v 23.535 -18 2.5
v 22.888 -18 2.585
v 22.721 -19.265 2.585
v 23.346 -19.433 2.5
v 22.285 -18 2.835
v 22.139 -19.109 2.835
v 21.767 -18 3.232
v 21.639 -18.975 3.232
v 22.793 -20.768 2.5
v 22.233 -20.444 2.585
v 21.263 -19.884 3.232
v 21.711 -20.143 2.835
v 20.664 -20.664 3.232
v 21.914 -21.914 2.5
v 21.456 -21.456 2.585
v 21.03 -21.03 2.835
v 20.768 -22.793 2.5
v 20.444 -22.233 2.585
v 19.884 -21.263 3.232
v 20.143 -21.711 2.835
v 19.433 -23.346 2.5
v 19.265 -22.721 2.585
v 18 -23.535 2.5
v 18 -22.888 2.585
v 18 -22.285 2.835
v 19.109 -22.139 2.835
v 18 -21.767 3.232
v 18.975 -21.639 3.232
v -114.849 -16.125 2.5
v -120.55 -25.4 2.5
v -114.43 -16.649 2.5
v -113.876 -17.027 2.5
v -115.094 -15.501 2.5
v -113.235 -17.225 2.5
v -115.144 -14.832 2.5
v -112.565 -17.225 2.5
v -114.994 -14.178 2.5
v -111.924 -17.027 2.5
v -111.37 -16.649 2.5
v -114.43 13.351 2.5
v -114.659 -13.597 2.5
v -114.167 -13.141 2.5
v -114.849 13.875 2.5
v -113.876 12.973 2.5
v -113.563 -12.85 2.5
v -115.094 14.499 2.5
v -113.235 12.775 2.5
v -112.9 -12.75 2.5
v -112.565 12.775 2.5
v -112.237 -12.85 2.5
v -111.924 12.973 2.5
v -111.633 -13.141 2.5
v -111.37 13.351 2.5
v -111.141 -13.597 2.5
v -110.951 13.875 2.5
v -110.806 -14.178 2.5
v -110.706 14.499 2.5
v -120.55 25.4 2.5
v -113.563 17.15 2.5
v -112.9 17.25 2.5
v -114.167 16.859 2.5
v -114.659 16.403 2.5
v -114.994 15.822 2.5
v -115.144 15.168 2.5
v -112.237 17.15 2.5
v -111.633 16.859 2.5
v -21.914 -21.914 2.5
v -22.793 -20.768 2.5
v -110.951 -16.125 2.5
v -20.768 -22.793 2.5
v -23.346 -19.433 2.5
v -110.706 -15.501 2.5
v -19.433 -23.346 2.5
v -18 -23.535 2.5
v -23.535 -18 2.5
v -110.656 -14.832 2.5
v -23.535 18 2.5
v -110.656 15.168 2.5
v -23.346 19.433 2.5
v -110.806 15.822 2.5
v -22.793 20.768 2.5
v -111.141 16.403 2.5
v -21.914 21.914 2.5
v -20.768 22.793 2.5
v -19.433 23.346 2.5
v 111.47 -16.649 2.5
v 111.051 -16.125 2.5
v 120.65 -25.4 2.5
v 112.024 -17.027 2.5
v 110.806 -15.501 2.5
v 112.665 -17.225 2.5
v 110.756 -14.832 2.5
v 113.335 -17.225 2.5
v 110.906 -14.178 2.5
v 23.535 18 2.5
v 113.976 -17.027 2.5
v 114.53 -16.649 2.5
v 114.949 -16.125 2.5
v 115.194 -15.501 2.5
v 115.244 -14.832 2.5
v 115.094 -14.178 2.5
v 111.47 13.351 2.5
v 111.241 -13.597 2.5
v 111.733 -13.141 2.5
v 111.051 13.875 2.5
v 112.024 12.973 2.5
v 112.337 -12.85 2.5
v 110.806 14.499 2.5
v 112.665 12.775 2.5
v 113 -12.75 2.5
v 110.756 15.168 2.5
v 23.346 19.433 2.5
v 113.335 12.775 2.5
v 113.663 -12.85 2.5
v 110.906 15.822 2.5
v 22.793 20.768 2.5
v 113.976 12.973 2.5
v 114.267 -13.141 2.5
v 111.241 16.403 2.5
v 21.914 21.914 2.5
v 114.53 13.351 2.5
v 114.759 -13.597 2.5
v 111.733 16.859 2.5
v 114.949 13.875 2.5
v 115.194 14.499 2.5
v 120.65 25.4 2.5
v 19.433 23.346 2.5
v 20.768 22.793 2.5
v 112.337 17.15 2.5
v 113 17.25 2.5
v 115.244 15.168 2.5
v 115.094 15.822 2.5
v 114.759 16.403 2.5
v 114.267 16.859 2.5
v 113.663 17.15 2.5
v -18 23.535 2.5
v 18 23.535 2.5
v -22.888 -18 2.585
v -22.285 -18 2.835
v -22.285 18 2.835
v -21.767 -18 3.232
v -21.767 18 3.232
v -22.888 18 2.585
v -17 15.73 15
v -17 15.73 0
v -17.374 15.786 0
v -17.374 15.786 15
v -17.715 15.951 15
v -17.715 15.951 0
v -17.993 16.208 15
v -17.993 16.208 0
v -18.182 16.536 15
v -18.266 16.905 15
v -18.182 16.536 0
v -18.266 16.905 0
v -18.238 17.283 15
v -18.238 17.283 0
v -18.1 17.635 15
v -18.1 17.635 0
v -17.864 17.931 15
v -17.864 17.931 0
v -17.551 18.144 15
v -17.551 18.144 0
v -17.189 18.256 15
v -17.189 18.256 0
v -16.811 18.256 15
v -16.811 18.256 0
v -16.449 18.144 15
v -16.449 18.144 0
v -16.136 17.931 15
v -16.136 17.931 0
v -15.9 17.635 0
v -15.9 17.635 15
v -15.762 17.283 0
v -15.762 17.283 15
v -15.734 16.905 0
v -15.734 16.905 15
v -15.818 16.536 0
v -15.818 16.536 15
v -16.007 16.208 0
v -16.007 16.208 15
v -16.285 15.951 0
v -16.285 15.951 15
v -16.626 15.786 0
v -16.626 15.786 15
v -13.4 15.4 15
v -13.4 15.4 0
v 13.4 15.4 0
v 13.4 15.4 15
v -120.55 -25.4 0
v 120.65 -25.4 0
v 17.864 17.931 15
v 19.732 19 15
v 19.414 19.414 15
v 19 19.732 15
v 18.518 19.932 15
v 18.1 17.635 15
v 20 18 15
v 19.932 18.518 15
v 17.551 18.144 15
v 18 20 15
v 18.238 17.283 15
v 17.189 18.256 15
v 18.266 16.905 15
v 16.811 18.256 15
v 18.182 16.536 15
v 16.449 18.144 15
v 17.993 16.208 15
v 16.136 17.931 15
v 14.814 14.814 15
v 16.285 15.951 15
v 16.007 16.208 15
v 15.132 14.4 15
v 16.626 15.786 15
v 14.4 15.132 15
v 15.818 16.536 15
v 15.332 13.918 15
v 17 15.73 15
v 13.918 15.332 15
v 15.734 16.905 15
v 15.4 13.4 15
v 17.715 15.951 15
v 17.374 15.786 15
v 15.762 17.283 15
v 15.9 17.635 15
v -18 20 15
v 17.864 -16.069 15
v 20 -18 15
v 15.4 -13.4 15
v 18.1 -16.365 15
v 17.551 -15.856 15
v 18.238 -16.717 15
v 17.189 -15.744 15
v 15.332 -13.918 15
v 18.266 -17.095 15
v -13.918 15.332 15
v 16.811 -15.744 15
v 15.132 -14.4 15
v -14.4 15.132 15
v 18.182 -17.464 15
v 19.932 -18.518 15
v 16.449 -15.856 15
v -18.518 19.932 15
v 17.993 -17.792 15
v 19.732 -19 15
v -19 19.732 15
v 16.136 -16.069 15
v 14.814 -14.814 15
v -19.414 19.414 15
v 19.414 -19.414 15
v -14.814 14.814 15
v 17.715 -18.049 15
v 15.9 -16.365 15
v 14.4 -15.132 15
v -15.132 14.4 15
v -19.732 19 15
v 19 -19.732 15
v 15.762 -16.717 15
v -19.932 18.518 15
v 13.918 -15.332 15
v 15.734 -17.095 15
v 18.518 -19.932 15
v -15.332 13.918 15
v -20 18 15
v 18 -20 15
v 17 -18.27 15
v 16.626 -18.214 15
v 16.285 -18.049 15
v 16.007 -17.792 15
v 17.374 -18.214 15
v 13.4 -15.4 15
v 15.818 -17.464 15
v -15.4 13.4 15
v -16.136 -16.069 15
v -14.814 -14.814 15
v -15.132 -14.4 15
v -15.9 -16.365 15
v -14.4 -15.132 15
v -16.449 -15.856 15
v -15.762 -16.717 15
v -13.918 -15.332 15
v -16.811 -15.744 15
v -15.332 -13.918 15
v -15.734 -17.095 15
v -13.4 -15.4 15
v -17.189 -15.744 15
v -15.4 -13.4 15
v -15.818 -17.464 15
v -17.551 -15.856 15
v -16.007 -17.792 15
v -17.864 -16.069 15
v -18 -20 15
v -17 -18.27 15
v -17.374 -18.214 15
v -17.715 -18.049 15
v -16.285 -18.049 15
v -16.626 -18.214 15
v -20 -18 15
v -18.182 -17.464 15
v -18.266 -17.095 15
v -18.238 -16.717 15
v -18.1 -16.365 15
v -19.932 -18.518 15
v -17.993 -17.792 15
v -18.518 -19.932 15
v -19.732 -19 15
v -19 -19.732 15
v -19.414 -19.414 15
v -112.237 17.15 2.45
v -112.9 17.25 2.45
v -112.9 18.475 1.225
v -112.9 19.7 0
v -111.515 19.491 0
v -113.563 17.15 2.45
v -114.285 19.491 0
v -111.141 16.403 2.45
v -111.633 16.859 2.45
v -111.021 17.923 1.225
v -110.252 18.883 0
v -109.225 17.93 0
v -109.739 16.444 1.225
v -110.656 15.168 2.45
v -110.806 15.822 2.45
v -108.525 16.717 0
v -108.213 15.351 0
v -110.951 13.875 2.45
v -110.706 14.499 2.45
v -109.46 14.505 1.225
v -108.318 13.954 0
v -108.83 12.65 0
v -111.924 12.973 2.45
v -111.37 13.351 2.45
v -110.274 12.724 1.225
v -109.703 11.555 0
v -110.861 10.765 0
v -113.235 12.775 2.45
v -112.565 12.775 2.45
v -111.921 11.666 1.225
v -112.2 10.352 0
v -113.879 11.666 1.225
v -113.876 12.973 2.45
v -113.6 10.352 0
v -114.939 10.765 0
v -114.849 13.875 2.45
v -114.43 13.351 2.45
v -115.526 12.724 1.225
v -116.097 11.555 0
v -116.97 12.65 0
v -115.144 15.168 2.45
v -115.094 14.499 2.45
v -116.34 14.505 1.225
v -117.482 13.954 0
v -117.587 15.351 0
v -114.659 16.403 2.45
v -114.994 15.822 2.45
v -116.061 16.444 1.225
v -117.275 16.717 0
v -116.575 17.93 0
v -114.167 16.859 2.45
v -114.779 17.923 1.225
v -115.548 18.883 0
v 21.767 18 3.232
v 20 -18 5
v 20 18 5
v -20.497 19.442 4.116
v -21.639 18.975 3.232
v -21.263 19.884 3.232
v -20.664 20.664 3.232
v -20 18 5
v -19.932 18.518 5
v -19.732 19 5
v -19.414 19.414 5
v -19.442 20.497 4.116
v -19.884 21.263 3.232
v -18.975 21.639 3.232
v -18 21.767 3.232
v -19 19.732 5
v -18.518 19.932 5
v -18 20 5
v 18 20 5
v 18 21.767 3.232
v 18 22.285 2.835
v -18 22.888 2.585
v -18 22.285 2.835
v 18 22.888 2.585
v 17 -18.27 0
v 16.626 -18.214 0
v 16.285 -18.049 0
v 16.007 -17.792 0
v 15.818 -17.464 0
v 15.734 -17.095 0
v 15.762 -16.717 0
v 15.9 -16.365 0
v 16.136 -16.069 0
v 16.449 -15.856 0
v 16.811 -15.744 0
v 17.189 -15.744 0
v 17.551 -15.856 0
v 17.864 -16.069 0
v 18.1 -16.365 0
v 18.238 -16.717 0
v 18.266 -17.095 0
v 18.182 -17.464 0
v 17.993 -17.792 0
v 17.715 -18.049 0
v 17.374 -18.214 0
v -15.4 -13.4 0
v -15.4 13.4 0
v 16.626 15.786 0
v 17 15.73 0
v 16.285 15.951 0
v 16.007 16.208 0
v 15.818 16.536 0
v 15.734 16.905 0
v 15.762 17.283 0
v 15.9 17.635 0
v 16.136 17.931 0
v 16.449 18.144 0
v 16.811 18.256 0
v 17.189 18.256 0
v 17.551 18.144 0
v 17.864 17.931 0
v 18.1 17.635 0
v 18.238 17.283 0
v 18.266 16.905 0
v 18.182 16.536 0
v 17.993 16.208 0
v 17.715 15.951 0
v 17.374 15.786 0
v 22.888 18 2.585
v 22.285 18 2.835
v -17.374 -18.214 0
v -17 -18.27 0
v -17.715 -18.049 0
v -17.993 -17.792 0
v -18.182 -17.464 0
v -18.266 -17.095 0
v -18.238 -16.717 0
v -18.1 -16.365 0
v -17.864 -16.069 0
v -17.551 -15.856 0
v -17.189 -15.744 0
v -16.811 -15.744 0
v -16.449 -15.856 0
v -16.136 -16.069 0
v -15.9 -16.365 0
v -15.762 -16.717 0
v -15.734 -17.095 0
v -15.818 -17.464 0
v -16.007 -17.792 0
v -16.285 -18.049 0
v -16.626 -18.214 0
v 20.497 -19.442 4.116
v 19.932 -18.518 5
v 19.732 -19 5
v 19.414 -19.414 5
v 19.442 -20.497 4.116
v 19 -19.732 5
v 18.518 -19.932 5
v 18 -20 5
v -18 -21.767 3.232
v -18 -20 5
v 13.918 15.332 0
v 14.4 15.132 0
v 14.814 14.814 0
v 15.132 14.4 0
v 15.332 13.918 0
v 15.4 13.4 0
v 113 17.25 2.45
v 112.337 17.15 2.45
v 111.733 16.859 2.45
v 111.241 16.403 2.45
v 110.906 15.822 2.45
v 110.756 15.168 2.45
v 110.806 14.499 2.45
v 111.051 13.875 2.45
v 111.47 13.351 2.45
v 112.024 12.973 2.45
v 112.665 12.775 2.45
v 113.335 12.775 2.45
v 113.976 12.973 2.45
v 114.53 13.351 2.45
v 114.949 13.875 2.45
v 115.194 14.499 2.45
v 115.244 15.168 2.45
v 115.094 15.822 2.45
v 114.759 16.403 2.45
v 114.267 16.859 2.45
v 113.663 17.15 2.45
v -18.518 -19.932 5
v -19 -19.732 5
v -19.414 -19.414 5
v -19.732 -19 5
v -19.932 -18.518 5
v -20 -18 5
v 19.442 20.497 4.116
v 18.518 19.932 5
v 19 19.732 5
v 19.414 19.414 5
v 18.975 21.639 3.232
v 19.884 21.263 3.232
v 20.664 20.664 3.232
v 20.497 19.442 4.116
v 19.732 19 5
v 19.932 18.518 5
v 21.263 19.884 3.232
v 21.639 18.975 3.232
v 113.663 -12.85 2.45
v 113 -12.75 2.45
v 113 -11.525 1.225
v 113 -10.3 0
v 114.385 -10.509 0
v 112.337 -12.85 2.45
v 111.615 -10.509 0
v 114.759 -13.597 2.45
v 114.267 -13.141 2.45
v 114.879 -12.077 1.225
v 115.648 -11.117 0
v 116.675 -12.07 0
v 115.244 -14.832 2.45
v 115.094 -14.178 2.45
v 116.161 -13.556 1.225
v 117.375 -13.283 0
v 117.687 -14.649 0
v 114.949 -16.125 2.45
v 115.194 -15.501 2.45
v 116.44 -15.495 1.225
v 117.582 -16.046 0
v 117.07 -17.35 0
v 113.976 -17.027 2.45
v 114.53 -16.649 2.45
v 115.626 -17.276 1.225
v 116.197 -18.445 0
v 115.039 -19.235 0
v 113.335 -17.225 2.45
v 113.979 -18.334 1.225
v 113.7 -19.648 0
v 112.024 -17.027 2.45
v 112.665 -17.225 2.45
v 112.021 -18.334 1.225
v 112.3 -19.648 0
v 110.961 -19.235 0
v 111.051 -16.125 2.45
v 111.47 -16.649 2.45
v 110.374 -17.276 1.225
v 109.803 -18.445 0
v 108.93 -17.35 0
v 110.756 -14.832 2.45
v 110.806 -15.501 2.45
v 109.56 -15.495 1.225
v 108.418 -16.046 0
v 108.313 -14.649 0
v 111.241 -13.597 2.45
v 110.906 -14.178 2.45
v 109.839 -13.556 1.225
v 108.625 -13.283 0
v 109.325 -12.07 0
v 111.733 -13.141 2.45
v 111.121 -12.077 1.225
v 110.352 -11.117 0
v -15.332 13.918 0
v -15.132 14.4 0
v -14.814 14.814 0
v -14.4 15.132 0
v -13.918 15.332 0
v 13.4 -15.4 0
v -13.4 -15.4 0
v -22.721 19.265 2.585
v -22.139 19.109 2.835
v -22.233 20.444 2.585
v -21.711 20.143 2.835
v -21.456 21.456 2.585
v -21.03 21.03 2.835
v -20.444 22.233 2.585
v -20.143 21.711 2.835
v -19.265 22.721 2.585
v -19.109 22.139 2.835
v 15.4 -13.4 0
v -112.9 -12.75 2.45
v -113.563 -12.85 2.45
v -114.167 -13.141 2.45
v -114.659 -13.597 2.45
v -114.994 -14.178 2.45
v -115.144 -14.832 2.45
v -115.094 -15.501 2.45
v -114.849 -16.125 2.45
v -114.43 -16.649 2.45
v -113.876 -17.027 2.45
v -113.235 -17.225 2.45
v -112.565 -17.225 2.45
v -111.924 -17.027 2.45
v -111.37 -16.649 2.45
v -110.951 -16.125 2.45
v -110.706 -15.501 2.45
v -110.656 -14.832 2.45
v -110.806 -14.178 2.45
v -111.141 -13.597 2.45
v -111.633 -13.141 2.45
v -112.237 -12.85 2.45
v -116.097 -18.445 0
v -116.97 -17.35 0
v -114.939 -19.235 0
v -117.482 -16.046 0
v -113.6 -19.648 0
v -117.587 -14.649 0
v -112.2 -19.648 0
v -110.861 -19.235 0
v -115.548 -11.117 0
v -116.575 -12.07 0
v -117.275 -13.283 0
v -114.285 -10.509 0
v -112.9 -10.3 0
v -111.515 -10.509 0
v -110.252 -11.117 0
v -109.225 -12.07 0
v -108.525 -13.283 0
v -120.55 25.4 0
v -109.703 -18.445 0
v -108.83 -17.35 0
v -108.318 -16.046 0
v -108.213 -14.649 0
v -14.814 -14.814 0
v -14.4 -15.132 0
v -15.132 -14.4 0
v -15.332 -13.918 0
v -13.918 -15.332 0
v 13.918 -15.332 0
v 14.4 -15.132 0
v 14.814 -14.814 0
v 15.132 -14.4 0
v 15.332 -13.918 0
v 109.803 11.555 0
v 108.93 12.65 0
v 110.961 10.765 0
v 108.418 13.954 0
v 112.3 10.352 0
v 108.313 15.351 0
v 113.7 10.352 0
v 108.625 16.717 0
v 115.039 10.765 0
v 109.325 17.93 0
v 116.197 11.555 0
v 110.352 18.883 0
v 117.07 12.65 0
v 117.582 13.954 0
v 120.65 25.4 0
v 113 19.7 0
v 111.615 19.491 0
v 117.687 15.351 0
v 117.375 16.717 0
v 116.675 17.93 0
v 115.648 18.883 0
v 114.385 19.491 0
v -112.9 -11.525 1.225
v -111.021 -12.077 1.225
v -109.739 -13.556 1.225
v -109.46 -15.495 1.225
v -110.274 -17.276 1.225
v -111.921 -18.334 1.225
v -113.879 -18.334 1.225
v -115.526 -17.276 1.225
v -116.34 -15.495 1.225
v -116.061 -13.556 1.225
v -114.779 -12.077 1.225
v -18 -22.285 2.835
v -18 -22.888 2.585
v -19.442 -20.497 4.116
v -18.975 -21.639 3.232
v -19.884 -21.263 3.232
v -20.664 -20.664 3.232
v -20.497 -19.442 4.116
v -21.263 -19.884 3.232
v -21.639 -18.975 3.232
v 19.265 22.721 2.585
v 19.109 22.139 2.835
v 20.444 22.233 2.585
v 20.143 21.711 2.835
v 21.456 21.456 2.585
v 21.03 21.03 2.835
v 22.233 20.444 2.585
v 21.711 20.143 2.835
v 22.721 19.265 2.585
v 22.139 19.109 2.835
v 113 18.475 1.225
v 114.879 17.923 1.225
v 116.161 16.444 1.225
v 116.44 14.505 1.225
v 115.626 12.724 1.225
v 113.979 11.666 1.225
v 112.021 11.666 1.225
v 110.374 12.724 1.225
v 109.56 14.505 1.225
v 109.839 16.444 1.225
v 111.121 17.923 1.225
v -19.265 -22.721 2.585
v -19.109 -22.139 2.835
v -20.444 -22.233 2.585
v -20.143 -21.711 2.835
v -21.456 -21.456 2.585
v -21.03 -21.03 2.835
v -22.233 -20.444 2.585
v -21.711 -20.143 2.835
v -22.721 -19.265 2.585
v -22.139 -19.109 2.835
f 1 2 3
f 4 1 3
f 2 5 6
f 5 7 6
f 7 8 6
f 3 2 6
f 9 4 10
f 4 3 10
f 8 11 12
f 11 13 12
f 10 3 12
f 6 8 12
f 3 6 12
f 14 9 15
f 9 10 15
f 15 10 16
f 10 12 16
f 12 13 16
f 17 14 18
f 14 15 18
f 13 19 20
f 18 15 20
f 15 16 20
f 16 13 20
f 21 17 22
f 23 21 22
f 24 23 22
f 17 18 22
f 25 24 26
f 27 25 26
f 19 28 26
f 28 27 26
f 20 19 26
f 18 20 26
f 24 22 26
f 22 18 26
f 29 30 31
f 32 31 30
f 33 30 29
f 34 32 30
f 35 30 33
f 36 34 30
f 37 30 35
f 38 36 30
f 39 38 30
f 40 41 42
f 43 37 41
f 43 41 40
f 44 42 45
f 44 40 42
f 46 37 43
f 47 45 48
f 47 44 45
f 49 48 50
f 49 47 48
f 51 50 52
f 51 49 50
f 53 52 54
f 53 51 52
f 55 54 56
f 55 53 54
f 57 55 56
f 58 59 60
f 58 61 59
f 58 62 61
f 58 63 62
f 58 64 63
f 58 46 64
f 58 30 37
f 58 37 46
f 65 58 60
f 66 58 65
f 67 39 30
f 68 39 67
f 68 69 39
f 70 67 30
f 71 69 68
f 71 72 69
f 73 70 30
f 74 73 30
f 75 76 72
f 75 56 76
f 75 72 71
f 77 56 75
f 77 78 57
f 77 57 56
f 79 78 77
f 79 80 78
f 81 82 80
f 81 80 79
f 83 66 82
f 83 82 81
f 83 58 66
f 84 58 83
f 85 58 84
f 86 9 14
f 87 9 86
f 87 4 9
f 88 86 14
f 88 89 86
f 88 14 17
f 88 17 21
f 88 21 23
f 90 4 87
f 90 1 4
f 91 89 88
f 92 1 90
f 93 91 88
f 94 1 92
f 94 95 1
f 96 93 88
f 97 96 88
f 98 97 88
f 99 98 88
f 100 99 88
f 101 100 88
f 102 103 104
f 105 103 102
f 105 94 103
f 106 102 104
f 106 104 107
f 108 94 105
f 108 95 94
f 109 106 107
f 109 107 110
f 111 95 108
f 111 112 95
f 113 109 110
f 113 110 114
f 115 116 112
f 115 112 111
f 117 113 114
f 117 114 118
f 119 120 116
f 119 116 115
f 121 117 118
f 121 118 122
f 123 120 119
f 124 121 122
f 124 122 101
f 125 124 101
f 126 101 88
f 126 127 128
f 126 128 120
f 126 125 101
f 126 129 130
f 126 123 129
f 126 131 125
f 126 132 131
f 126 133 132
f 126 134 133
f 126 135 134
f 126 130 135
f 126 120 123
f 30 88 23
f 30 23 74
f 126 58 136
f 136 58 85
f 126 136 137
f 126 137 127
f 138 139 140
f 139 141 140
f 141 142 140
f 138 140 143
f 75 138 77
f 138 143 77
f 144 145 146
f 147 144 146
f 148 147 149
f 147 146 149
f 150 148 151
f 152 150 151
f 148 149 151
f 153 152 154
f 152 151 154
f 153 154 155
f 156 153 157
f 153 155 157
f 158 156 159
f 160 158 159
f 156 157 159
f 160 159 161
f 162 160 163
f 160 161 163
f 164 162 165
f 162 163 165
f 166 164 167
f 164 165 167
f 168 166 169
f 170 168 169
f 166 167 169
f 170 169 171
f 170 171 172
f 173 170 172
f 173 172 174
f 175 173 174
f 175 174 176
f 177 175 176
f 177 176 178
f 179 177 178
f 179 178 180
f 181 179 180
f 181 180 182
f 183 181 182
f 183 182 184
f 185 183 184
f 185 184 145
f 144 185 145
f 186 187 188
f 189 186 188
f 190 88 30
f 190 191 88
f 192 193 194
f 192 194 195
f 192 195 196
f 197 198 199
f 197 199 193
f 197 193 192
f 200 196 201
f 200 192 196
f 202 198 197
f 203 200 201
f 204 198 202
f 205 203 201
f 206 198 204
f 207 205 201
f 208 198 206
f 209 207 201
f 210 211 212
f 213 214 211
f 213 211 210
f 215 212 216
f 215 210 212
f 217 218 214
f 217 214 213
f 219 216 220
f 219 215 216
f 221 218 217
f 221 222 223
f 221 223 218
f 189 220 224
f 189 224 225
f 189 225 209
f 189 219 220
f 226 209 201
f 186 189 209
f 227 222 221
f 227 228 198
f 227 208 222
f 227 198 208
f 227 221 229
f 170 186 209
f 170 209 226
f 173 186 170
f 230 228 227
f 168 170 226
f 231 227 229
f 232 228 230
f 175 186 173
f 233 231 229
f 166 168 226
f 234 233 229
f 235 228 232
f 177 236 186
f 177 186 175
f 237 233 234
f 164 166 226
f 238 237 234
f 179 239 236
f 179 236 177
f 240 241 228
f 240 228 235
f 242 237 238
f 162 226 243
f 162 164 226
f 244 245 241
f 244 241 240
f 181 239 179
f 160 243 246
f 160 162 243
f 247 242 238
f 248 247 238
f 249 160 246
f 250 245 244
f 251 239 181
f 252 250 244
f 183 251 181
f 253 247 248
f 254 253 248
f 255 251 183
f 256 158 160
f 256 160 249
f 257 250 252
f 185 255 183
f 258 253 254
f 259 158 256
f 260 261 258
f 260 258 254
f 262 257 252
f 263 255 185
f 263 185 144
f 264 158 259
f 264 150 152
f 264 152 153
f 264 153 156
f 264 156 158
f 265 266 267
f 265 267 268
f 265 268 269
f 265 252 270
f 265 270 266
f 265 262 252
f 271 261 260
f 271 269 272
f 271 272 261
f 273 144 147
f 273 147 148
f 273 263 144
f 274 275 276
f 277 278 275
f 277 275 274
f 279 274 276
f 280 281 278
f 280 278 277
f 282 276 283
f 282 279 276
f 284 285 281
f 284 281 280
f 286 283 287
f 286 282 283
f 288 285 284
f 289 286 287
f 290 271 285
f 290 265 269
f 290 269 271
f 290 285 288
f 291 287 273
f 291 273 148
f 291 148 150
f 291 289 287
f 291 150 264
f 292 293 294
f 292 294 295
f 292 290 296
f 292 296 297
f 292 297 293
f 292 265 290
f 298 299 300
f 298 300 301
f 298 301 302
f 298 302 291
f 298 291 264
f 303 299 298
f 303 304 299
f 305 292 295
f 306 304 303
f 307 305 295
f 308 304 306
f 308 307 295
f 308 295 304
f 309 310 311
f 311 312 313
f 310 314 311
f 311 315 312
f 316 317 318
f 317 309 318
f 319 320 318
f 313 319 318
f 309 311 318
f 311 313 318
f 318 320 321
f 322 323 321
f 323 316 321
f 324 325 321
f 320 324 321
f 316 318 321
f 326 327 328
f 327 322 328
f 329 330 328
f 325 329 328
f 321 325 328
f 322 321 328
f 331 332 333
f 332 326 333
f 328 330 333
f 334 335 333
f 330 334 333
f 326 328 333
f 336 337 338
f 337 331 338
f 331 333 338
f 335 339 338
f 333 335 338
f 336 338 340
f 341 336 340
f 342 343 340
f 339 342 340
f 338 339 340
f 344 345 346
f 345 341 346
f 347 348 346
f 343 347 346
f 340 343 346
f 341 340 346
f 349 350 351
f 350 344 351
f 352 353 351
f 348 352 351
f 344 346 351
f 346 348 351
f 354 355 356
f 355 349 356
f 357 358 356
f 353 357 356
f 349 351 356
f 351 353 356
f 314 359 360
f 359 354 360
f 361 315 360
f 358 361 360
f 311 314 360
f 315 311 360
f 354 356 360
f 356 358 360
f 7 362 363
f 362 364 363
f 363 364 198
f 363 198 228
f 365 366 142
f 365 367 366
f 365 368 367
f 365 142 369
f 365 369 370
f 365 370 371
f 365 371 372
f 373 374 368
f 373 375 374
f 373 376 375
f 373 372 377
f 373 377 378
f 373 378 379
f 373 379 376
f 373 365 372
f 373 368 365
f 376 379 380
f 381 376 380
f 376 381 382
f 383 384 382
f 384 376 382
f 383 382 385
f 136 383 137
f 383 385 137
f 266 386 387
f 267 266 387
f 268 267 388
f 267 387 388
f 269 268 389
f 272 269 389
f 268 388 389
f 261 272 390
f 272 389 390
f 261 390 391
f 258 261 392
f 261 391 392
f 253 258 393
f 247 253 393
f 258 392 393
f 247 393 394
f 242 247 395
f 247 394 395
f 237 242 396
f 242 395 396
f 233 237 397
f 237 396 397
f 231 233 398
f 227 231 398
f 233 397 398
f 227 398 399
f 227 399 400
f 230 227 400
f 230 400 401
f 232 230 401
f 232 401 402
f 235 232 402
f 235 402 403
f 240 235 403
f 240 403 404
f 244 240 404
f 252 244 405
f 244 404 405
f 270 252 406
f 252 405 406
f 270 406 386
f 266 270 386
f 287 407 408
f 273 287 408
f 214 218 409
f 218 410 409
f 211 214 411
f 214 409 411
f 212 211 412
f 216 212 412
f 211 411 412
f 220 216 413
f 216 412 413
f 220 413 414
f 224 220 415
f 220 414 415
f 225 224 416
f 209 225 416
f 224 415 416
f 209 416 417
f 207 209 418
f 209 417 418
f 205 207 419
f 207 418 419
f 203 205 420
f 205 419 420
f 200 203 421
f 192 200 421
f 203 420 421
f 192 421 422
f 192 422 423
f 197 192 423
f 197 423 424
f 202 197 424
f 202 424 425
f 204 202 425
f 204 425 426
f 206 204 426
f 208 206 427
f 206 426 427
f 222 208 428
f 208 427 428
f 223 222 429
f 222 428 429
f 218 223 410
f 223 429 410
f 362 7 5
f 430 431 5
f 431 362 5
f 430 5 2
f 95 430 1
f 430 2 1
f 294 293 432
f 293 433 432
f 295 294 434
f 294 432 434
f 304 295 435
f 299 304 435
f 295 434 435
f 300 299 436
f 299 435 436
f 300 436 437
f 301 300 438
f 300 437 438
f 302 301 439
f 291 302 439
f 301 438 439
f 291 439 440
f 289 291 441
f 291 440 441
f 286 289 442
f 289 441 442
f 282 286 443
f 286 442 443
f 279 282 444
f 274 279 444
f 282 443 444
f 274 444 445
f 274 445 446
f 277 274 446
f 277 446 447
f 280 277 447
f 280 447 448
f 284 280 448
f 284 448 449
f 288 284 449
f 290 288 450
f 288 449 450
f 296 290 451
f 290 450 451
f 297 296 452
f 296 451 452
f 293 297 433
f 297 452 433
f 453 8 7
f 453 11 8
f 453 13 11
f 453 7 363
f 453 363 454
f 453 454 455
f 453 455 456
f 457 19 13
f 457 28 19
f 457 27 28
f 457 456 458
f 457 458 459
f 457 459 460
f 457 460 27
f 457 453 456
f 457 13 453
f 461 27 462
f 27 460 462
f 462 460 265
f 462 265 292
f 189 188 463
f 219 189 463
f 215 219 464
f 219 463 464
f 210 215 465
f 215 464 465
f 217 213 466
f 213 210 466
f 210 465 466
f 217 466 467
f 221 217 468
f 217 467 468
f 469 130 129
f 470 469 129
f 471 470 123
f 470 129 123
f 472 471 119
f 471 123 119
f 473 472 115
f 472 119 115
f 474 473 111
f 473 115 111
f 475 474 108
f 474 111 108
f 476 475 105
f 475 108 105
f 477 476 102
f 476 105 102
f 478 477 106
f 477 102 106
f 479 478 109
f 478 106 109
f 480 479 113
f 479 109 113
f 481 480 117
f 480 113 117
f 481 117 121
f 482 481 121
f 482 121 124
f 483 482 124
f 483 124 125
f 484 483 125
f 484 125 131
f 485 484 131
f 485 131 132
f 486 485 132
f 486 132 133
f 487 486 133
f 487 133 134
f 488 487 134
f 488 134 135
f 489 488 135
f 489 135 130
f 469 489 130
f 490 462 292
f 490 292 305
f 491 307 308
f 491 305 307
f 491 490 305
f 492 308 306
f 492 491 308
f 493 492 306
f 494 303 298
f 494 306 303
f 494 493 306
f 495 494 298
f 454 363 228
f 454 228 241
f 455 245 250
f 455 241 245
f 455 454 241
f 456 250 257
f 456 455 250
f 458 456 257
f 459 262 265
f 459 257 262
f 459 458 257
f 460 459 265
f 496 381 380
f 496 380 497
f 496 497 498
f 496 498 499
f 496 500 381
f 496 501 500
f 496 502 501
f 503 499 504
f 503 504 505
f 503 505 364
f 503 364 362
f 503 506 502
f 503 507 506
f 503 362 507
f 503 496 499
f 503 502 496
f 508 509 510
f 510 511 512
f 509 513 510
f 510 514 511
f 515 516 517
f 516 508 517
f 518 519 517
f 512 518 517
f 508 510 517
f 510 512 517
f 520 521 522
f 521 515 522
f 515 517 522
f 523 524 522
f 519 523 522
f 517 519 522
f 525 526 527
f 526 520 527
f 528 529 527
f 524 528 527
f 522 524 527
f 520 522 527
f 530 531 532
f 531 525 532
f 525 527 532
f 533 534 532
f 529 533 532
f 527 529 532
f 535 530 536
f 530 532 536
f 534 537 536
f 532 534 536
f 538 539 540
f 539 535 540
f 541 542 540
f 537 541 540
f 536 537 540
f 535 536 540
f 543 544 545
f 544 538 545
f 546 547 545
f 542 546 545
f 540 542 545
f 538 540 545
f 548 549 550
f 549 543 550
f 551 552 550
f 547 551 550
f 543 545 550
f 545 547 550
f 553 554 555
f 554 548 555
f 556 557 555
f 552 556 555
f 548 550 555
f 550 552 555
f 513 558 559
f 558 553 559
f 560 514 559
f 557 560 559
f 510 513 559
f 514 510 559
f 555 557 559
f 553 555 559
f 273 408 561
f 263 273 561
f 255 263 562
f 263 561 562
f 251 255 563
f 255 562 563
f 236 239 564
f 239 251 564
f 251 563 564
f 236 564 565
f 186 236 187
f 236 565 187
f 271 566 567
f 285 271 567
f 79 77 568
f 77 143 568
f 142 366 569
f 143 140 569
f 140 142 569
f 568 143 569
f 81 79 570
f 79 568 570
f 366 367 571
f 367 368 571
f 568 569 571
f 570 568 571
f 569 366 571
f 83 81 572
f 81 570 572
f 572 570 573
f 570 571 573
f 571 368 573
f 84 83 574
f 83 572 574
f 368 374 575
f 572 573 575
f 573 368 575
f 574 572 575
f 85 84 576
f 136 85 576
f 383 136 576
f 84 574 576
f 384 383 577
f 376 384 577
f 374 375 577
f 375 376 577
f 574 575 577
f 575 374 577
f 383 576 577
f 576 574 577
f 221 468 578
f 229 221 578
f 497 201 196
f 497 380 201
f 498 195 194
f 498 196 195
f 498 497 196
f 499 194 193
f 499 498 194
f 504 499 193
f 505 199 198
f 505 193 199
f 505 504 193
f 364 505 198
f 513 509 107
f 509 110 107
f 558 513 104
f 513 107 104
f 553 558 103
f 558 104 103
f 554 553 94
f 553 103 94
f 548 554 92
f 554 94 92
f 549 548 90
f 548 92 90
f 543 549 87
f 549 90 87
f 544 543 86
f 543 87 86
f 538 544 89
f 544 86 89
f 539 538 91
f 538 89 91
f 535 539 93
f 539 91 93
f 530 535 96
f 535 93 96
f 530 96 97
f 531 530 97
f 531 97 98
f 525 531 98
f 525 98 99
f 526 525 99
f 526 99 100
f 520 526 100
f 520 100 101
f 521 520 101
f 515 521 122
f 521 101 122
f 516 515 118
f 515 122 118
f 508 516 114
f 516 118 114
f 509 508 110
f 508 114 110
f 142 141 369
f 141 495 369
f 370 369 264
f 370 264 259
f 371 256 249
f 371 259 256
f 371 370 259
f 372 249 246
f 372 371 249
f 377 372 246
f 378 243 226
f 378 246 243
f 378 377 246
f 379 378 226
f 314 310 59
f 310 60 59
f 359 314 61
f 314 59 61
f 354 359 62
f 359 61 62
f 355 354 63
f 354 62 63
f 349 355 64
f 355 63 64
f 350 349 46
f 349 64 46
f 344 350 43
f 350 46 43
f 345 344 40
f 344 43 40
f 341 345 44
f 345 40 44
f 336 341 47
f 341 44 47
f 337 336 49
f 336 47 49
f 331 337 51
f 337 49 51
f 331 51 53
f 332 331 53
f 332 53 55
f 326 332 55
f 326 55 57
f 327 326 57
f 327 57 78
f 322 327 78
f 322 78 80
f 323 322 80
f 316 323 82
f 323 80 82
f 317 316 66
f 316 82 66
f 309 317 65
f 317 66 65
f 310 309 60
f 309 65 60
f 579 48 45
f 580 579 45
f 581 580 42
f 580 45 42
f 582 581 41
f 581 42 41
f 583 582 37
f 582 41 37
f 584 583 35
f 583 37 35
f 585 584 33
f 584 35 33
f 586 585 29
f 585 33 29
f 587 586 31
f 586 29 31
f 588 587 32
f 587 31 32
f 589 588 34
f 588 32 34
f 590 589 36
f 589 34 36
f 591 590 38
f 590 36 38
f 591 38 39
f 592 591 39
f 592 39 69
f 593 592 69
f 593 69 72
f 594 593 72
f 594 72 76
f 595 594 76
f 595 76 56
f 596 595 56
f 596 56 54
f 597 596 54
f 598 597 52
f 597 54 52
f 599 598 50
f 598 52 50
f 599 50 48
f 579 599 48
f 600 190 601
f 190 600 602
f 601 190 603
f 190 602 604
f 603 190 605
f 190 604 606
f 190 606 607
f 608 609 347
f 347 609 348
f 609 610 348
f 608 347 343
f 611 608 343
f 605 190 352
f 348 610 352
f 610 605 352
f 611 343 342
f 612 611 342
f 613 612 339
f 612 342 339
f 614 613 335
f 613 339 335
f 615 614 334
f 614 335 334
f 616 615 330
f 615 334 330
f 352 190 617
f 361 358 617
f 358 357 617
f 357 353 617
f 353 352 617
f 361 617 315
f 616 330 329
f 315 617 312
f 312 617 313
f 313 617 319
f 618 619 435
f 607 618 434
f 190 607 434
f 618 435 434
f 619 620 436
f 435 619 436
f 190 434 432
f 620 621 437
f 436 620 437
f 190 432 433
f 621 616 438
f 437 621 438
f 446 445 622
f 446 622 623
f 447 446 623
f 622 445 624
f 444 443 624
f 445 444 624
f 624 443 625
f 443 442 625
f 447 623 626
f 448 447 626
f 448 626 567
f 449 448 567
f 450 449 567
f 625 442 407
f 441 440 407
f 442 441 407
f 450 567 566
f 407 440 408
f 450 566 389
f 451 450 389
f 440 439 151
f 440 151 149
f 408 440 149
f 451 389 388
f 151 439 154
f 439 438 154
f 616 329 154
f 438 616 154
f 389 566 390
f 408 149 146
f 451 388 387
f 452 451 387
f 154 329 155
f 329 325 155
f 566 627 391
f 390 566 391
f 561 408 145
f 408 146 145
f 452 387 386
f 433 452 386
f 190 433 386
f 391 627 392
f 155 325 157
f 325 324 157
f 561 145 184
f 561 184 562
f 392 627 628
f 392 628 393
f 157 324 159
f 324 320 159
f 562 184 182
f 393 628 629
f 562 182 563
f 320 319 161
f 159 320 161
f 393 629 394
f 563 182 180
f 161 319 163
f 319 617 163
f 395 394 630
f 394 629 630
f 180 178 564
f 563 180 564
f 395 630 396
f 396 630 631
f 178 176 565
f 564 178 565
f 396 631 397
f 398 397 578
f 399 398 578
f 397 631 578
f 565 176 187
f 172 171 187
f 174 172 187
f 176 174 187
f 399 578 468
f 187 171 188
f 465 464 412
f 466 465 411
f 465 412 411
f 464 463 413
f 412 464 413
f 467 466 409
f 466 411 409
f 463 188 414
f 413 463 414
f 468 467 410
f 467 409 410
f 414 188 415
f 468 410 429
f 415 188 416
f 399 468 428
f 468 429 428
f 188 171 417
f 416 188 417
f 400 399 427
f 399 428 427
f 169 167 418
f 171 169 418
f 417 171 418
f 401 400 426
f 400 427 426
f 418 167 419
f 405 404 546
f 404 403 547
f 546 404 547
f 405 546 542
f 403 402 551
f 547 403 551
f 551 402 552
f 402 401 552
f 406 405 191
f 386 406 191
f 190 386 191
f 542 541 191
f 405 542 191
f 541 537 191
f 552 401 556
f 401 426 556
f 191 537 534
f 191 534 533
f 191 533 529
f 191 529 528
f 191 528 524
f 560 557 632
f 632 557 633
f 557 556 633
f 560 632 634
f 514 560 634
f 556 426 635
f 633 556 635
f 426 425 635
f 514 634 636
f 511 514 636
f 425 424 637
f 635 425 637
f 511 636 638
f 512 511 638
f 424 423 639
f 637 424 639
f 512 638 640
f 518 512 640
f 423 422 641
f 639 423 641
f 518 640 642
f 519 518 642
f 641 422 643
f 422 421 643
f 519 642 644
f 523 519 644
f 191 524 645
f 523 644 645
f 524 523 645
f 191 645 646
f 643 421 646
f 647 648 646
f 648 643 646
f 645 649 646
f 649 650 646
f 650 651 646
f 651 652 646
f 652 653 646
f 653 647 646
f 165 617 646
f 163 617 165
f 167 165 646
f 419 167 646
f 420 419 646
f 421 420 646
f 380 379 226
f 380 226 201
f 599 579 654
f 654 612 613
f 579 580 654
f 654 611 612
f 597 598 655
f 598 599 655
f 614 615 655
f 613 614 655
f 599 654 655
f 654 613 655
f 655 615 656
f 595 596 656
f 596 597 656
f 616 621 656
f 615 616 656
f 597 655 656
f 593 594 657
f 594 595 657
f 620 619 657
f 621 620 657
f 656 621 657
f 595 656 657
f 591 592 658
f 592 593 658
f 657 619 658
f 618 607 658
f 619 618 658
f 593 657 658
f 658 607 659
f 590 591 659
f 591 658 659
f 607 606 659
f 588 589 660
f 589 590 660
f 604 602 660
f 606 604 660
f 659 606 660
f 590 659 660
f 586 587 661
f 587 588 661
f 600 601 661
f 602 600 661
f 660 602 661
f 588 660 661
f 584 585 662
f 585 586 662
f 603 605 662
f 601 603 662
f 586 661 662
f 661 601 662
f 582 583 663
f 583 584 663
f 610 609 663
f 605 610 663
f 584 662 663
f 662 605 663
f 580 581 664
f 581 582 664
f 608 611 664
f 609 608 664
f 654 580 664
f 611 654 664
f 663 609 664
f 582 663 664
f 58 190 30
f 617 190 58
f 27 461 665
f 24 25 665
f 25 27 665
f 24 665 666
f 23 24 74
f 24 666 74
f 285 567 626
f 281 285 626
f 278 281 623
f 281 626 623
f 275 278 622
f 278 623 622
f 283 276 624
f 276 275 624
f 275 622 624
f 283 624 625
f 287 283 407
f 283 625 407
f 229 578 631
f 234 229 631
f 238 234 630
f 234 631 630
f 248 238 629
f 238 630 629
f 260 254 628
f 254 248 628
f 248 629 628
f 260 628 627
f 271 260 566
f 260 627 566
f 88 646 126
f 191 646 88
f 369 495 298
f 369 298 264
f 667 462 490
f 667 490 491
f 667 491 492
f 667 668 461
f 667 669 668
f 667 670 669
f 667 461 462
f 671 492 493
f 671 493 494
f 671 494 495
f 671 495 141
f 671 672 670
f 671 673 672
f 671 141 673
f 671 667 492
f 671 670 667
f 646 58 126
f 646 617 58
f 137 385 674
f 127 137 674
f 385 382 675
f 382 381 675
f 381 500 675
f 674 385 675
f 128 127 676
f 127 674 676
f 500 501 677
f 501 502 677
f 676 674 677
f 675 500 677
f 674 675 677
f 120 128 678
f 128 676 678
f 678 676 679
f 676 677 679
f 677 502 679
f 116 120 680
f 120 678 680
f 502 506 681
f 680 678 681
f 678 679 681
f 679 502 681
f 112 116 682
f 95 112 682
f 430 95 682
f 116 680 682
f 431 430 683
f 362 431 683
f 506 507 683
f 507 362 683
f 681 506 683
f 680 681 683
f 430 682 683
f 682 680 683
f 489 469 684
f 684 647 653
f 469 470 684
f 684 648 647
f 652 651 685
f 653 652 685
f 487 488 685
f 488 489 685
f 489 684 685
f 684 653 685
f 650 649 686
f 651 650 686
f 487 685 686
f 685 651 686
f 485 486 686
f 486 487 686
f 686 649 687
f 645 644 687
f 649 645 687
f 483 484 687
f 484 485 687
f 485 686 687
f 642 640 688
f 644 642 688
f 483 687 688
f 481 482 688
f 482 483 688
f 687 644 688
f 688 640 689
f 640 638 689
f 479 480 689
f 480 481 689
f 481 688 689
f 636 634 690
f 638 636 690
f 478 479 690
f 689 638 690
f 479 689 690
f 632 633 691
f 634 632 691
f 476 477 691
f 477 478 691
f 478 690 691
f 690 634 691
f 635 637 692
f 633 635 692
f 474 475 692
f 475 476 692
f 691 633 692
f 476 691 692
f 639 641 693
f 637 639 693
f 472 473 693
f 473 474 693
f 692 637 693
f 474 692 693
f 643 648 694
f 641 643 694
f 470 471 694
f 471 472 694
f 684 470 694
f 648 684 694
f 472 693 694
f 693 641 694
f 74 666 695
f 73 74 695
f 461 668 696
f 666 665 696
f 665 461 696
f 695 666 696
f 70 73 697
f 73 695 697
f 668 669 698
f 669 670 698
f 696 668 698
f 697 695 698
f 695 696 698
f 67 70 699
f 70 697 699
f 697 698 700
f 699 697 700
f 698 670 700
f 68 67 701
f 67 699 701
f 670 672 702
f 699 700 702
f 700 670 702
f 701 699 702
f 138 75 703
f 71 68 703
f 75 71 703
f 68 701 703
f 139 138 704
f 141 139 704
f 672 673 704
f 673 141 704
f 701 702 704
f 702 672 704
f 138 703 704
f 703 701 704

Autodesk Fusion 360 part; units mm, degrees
sketch "Sketch1" plane through (0, 0, 0) normal (0, 0, 1) x (1, 0, 0)
  line L0 (-120.55, 25.4) -> (120.65, 25.4)
  line L1 (120.65, 25.4) -> (120.65, -25.4)
  line L2 (120.65, -25.4) -> (-120.55, -25.4)
  line L3 (-120.55, -25.4) -> (-120.55, 25.4)
  dimension "d3" = 241.2
  dimension "d4" = 50.8
  dimension "d5" = 25.4
  dimension "d6" = 120.65
extrude "Extrude1" add sketch "Sketch1" along normal blind 2.5
sketch "Sketch2" plane through (0, 0, 2.5) normal (0, 0, 1) x (-1, 0, 0)
  line L0 (120.55, 25.4) -> (-120.65, 25.4)
  line L1 (-120.65, 25.4) -> (-120.65, -25.4)
  line L2 (-120.65, -25.4) -> (120.55, -25.4)
  line L3 (120.55, -25.4) -> (120.55, 25.4)
  line L4 (13.4, -15.4) -> (-13.4, -15.4)
  line L5 (-15.4, -13.4) -> (-15.4, 13.4)
  line L6 (-13.4, 15.4) -> (13.4, 15.4)
  line L7 (15.4, 13.4) -> (15.4, -13.4)
  arc A0 (13.4, -15.4) -> (15.4, -13.4) centre (13.4, -13.4) ccw
  arc A1 (-15.4, -13.4) -> (-13.4, -15.4) centre (-13.4, -13.4) ccw
  arc A2 (-13.4, 15.4) -> (-15.4, 13.4) centre (-13.4, 13.4) ccw
  arc A3 (15.4, 13.4) -> (13.4, 15.4) centre (13.4, 13.4) ccw
  dimension "d7" = 30.8
  dimension "d8" = 30.8
  dimension "d9" = 15.4
  dimension "d10" = 15.4
  dimension "d11" = 2
extrude "Extrude2" cut sketch "Sketch2" against normal blind 2.5 contours L4 L5 L6 L7 A0 A1 A2 A3
sketch "Sketch4" plane through (0, 0, 2.5) normal (0, 0, 1) x (-1, 0, 0)
  line L0 (15.4, 13.4) -> (15.4, -13.4)
  arc A0 (13.4, -15.4) -> (15.4, -13.4) centre (13.4, -13.4) ccw
  line L1 (13.4, -15.4) -> (-13.4, -15.4)
  arc A1 (-15.4, -13.4) -> (-13.4, -15.4) centre (-13.4, -13.4) ccw
  line L2 (-15.4, -13.4) -> (-15.4, 13.4)
  arc A2 (-13.4, 15.4) -> (-15.4, 13.4) centre (-13.4, 13.4) ccw
  line L3 (-13.4, 15.4) -> (13.4, 15.4)
  arc A3 (15.4, 13.4) -> (13.4, 15.4) centre (13.4, 13.4) ccw
  line L4 (120.55, 25.4) -> (-120.65, 25.4)
  line L5 (-120.65, 25.4) -> (-120.65, -25.4)
  line L6 (-120.65, -25.4) -> (120.55, -25.4)
  line L7 (120.55, -25.4) -> (120.55, 25.4)
  line L8 (18, -20) -> (-18, -20)
  line L9 (-20, -18) -> (-20, 18)
  line L10 (-18, 20) -> (18, 20)
  line L11 (20, 18) -> (20, -18)
  arc A4 (18, -20) -> (20, -18) centre (18, -18) ccw
  arc A5 (-20, -18) -> (-18, -20) centre (-18, -18) ccw
  arc A6 (-18, 20) -> (-20, 18) centre (-18, 18) ccw
  arc A7 (20, 18) -> (18, 20) centre (18, 18) ccw
  dimension "d18" = 40
  dimension "d19" = 40
  dimension "d20" = 20
  dimension "d21" = 20
  dimension "d22" = 2
extrude "Extrude3" add sketch "Sketch4" along normal blind 2.5 contours L8 L9 L10 L11 A4 A5 A6 A7
sketch "Sketch6" plane through (0, 0, 5) normal (0, 0, 1) x (-1, 0, 0)
  arc A0 (13.4, -15.4) -> (15.4, -13.4) centre (13.4, -13.4) ccw
  line L0 (13.4, -15.4) -> (-13.4, -15.4)
  arc A1 (-15.4, -13.4) -> (-13.4, -15.4) centre (-13.4, -13.4) ccw
  line L1 (-15.4, -13.4) -> (-15.4, 13.4)
  arc A2 (-13.4, 15.4) -> (-15.4, 13.4) centre (-13.4, 13.4) ccw
  line L2 (-13.4, 15.4) -> (13.4, 15.4)
  arc A3 (15.4, 13.4) -> (13.4, 15.4) centre (13.4, 13.4) ccw
  line L3 (15.4, 13.4) -> (15.4, -13.4)
  arc A4 (18, -20) -> (20, -18) centre (18, -18) ccw
  line L4 (20, -18) -> (20, 18)
  arc A5 (20, 18) -> (18, 20) centre (18, 18) ccw
  line L5 (18, 20) -> (-18, 20)
  arc A6 (-18, 20) -> (-20, 18) centre (-18, 18) ccw
  line L6 (-20, 18) -> (-20, -18)
  arc A7 (-20, -18) -> (-18, -20) centre (-18, -18) ccw
  line L7 (-18, -20) -> (18, -20)
  point P0 (17, -17)
  point P1 (-17, -17)
  point P2 (-17, 17)
  point P3 (17, 17)
  dimension "d29" = 34
  dimension "d30" = 34
  dimension "d31" = 17
  dimension "d32" = 17
hole "Hole1" at (-17, 17, 5) at (17, 17, 5) at (17, -17, 5) at (-17, -17, 5) direction (0, 0, -1) diameter 2.54 depth 5 tip angle 118
chamfer "Chamfer1" distance 2.5 distance2 2.5 8 edges at (0, -20, 2.5) (-19.4142, -19.4142, 2.5) (-20, 0, 2.5) (-19.4142, 19.4142, 2.5) (0, 20, 2.5) (19.4142, 19.4142, 2.5) (20, 0, 2.5) (19.4142, -19.4142, 2.5) measured on face at (87.1, -6, 2.5) measured on face at (87.1, -6, 2.5) measured on face at (87.1, -6, 2.5) measured on face at (87.1, -6, 2.5) measured on face at (87.1, -6, 2.5) measured on face at (87.1, -6, 2.5) measured on face at (87.1, -6, 2.5) measured on face at (87.1, -6, 2.5)
fillet "Fillet1" radius 2.5 8 edges at (22.5, 0, 2.5) (21.182, 21.182, 2.5) (0, 22.5, 2.5) (-21.182, 21.182, 2.5) (-22.5, 0, 2.5) (-21.182, -21.182, 2.5) (0, -22.5, 2.5) (21.182, -21.182, 2.5)
sketch "Sketch7" plane through (0, 0, 0) normal (0, 0, -1) x (1, 0, 0)
  circle A0 centre (17, 17) radius 1.27
  circle A1 centre (-17, -17) radius 1.27
  circle A2 centre (17, -17) radius 1.27
  circle A3 centre (-17, 17) radius 1.27
  line L0 (-15.4, -13.4) -> (-15.4, 13.4)
  arc A4 (-13.4, 15.4) -> (-15.4, 13.4) centre (-13.4, 13.4) ccw
  line L1 (-13.4, 15.4) -> (13.4, 15.4)
  arc A5 (15.4, 13.4) -> (13.4, 15.4) centre (13.4, 13.4) ccw
  line L2 (15.4, 13.4) -> (15.4, -13.4)
  arc A6 (13.4, -15.4) -> (15.4, -13.4) centre (13.4, -13.4) ccw
  line L3 (13.4, -15.4) -> (-13.4, -15.4)
  arc A7 (-15.4, -13.4) -> (-13.4, -15.4) centre (-13.4, -13.4) ccw
  line L4 (120.65, 25.4) -> (-120.55, 25.4)
  line L5 (-120.55, 25.4) -> (-120.55, -25.4)
  line L6 (-120.55, -25.4) -> (120.65, -25.4)
  line L7 (120.65, -25.4) -> (120.65, 25.4)
  point P0 (-112.9, 15)
  point P1 (-112.9, -15)
  point P2 (113, 15)
  point P3 (113, -15)
  dimension "d40" = 30
  dimension "d41" = 7.65
  dimension "d42" = 7.65
  dimension "d48" = 10.4
hole "Hole2" at (-112.9, -15, 0) at (-112.9, 15, 0) at (113, -15, 0) at (113, 15, 0) direction (0, 0, 1) diameter 4.5 depth 5 tip angle 180 countersink diameter 9.4 countersink angle 90
extrude "Extrude5" add 1 faces at (-17.0425, 4.4667, 5) along direction (0, 0, 1) blind 10
equation "d3 = 9.5 in - 0.1 mm"
equation "d6 = ( 9.5 / 2 ) * 1 in"
equation "d41 = ( ( 15.4 / 2 ) * 1 mm ) - 0.05 * 1 mm"
equation "d42 = ( ( 15.4 / 2 ) * 1 mm ) - 0.05 * 1 mm"
equation "d48 = ( 2 in - 30 mm ) / 2"
